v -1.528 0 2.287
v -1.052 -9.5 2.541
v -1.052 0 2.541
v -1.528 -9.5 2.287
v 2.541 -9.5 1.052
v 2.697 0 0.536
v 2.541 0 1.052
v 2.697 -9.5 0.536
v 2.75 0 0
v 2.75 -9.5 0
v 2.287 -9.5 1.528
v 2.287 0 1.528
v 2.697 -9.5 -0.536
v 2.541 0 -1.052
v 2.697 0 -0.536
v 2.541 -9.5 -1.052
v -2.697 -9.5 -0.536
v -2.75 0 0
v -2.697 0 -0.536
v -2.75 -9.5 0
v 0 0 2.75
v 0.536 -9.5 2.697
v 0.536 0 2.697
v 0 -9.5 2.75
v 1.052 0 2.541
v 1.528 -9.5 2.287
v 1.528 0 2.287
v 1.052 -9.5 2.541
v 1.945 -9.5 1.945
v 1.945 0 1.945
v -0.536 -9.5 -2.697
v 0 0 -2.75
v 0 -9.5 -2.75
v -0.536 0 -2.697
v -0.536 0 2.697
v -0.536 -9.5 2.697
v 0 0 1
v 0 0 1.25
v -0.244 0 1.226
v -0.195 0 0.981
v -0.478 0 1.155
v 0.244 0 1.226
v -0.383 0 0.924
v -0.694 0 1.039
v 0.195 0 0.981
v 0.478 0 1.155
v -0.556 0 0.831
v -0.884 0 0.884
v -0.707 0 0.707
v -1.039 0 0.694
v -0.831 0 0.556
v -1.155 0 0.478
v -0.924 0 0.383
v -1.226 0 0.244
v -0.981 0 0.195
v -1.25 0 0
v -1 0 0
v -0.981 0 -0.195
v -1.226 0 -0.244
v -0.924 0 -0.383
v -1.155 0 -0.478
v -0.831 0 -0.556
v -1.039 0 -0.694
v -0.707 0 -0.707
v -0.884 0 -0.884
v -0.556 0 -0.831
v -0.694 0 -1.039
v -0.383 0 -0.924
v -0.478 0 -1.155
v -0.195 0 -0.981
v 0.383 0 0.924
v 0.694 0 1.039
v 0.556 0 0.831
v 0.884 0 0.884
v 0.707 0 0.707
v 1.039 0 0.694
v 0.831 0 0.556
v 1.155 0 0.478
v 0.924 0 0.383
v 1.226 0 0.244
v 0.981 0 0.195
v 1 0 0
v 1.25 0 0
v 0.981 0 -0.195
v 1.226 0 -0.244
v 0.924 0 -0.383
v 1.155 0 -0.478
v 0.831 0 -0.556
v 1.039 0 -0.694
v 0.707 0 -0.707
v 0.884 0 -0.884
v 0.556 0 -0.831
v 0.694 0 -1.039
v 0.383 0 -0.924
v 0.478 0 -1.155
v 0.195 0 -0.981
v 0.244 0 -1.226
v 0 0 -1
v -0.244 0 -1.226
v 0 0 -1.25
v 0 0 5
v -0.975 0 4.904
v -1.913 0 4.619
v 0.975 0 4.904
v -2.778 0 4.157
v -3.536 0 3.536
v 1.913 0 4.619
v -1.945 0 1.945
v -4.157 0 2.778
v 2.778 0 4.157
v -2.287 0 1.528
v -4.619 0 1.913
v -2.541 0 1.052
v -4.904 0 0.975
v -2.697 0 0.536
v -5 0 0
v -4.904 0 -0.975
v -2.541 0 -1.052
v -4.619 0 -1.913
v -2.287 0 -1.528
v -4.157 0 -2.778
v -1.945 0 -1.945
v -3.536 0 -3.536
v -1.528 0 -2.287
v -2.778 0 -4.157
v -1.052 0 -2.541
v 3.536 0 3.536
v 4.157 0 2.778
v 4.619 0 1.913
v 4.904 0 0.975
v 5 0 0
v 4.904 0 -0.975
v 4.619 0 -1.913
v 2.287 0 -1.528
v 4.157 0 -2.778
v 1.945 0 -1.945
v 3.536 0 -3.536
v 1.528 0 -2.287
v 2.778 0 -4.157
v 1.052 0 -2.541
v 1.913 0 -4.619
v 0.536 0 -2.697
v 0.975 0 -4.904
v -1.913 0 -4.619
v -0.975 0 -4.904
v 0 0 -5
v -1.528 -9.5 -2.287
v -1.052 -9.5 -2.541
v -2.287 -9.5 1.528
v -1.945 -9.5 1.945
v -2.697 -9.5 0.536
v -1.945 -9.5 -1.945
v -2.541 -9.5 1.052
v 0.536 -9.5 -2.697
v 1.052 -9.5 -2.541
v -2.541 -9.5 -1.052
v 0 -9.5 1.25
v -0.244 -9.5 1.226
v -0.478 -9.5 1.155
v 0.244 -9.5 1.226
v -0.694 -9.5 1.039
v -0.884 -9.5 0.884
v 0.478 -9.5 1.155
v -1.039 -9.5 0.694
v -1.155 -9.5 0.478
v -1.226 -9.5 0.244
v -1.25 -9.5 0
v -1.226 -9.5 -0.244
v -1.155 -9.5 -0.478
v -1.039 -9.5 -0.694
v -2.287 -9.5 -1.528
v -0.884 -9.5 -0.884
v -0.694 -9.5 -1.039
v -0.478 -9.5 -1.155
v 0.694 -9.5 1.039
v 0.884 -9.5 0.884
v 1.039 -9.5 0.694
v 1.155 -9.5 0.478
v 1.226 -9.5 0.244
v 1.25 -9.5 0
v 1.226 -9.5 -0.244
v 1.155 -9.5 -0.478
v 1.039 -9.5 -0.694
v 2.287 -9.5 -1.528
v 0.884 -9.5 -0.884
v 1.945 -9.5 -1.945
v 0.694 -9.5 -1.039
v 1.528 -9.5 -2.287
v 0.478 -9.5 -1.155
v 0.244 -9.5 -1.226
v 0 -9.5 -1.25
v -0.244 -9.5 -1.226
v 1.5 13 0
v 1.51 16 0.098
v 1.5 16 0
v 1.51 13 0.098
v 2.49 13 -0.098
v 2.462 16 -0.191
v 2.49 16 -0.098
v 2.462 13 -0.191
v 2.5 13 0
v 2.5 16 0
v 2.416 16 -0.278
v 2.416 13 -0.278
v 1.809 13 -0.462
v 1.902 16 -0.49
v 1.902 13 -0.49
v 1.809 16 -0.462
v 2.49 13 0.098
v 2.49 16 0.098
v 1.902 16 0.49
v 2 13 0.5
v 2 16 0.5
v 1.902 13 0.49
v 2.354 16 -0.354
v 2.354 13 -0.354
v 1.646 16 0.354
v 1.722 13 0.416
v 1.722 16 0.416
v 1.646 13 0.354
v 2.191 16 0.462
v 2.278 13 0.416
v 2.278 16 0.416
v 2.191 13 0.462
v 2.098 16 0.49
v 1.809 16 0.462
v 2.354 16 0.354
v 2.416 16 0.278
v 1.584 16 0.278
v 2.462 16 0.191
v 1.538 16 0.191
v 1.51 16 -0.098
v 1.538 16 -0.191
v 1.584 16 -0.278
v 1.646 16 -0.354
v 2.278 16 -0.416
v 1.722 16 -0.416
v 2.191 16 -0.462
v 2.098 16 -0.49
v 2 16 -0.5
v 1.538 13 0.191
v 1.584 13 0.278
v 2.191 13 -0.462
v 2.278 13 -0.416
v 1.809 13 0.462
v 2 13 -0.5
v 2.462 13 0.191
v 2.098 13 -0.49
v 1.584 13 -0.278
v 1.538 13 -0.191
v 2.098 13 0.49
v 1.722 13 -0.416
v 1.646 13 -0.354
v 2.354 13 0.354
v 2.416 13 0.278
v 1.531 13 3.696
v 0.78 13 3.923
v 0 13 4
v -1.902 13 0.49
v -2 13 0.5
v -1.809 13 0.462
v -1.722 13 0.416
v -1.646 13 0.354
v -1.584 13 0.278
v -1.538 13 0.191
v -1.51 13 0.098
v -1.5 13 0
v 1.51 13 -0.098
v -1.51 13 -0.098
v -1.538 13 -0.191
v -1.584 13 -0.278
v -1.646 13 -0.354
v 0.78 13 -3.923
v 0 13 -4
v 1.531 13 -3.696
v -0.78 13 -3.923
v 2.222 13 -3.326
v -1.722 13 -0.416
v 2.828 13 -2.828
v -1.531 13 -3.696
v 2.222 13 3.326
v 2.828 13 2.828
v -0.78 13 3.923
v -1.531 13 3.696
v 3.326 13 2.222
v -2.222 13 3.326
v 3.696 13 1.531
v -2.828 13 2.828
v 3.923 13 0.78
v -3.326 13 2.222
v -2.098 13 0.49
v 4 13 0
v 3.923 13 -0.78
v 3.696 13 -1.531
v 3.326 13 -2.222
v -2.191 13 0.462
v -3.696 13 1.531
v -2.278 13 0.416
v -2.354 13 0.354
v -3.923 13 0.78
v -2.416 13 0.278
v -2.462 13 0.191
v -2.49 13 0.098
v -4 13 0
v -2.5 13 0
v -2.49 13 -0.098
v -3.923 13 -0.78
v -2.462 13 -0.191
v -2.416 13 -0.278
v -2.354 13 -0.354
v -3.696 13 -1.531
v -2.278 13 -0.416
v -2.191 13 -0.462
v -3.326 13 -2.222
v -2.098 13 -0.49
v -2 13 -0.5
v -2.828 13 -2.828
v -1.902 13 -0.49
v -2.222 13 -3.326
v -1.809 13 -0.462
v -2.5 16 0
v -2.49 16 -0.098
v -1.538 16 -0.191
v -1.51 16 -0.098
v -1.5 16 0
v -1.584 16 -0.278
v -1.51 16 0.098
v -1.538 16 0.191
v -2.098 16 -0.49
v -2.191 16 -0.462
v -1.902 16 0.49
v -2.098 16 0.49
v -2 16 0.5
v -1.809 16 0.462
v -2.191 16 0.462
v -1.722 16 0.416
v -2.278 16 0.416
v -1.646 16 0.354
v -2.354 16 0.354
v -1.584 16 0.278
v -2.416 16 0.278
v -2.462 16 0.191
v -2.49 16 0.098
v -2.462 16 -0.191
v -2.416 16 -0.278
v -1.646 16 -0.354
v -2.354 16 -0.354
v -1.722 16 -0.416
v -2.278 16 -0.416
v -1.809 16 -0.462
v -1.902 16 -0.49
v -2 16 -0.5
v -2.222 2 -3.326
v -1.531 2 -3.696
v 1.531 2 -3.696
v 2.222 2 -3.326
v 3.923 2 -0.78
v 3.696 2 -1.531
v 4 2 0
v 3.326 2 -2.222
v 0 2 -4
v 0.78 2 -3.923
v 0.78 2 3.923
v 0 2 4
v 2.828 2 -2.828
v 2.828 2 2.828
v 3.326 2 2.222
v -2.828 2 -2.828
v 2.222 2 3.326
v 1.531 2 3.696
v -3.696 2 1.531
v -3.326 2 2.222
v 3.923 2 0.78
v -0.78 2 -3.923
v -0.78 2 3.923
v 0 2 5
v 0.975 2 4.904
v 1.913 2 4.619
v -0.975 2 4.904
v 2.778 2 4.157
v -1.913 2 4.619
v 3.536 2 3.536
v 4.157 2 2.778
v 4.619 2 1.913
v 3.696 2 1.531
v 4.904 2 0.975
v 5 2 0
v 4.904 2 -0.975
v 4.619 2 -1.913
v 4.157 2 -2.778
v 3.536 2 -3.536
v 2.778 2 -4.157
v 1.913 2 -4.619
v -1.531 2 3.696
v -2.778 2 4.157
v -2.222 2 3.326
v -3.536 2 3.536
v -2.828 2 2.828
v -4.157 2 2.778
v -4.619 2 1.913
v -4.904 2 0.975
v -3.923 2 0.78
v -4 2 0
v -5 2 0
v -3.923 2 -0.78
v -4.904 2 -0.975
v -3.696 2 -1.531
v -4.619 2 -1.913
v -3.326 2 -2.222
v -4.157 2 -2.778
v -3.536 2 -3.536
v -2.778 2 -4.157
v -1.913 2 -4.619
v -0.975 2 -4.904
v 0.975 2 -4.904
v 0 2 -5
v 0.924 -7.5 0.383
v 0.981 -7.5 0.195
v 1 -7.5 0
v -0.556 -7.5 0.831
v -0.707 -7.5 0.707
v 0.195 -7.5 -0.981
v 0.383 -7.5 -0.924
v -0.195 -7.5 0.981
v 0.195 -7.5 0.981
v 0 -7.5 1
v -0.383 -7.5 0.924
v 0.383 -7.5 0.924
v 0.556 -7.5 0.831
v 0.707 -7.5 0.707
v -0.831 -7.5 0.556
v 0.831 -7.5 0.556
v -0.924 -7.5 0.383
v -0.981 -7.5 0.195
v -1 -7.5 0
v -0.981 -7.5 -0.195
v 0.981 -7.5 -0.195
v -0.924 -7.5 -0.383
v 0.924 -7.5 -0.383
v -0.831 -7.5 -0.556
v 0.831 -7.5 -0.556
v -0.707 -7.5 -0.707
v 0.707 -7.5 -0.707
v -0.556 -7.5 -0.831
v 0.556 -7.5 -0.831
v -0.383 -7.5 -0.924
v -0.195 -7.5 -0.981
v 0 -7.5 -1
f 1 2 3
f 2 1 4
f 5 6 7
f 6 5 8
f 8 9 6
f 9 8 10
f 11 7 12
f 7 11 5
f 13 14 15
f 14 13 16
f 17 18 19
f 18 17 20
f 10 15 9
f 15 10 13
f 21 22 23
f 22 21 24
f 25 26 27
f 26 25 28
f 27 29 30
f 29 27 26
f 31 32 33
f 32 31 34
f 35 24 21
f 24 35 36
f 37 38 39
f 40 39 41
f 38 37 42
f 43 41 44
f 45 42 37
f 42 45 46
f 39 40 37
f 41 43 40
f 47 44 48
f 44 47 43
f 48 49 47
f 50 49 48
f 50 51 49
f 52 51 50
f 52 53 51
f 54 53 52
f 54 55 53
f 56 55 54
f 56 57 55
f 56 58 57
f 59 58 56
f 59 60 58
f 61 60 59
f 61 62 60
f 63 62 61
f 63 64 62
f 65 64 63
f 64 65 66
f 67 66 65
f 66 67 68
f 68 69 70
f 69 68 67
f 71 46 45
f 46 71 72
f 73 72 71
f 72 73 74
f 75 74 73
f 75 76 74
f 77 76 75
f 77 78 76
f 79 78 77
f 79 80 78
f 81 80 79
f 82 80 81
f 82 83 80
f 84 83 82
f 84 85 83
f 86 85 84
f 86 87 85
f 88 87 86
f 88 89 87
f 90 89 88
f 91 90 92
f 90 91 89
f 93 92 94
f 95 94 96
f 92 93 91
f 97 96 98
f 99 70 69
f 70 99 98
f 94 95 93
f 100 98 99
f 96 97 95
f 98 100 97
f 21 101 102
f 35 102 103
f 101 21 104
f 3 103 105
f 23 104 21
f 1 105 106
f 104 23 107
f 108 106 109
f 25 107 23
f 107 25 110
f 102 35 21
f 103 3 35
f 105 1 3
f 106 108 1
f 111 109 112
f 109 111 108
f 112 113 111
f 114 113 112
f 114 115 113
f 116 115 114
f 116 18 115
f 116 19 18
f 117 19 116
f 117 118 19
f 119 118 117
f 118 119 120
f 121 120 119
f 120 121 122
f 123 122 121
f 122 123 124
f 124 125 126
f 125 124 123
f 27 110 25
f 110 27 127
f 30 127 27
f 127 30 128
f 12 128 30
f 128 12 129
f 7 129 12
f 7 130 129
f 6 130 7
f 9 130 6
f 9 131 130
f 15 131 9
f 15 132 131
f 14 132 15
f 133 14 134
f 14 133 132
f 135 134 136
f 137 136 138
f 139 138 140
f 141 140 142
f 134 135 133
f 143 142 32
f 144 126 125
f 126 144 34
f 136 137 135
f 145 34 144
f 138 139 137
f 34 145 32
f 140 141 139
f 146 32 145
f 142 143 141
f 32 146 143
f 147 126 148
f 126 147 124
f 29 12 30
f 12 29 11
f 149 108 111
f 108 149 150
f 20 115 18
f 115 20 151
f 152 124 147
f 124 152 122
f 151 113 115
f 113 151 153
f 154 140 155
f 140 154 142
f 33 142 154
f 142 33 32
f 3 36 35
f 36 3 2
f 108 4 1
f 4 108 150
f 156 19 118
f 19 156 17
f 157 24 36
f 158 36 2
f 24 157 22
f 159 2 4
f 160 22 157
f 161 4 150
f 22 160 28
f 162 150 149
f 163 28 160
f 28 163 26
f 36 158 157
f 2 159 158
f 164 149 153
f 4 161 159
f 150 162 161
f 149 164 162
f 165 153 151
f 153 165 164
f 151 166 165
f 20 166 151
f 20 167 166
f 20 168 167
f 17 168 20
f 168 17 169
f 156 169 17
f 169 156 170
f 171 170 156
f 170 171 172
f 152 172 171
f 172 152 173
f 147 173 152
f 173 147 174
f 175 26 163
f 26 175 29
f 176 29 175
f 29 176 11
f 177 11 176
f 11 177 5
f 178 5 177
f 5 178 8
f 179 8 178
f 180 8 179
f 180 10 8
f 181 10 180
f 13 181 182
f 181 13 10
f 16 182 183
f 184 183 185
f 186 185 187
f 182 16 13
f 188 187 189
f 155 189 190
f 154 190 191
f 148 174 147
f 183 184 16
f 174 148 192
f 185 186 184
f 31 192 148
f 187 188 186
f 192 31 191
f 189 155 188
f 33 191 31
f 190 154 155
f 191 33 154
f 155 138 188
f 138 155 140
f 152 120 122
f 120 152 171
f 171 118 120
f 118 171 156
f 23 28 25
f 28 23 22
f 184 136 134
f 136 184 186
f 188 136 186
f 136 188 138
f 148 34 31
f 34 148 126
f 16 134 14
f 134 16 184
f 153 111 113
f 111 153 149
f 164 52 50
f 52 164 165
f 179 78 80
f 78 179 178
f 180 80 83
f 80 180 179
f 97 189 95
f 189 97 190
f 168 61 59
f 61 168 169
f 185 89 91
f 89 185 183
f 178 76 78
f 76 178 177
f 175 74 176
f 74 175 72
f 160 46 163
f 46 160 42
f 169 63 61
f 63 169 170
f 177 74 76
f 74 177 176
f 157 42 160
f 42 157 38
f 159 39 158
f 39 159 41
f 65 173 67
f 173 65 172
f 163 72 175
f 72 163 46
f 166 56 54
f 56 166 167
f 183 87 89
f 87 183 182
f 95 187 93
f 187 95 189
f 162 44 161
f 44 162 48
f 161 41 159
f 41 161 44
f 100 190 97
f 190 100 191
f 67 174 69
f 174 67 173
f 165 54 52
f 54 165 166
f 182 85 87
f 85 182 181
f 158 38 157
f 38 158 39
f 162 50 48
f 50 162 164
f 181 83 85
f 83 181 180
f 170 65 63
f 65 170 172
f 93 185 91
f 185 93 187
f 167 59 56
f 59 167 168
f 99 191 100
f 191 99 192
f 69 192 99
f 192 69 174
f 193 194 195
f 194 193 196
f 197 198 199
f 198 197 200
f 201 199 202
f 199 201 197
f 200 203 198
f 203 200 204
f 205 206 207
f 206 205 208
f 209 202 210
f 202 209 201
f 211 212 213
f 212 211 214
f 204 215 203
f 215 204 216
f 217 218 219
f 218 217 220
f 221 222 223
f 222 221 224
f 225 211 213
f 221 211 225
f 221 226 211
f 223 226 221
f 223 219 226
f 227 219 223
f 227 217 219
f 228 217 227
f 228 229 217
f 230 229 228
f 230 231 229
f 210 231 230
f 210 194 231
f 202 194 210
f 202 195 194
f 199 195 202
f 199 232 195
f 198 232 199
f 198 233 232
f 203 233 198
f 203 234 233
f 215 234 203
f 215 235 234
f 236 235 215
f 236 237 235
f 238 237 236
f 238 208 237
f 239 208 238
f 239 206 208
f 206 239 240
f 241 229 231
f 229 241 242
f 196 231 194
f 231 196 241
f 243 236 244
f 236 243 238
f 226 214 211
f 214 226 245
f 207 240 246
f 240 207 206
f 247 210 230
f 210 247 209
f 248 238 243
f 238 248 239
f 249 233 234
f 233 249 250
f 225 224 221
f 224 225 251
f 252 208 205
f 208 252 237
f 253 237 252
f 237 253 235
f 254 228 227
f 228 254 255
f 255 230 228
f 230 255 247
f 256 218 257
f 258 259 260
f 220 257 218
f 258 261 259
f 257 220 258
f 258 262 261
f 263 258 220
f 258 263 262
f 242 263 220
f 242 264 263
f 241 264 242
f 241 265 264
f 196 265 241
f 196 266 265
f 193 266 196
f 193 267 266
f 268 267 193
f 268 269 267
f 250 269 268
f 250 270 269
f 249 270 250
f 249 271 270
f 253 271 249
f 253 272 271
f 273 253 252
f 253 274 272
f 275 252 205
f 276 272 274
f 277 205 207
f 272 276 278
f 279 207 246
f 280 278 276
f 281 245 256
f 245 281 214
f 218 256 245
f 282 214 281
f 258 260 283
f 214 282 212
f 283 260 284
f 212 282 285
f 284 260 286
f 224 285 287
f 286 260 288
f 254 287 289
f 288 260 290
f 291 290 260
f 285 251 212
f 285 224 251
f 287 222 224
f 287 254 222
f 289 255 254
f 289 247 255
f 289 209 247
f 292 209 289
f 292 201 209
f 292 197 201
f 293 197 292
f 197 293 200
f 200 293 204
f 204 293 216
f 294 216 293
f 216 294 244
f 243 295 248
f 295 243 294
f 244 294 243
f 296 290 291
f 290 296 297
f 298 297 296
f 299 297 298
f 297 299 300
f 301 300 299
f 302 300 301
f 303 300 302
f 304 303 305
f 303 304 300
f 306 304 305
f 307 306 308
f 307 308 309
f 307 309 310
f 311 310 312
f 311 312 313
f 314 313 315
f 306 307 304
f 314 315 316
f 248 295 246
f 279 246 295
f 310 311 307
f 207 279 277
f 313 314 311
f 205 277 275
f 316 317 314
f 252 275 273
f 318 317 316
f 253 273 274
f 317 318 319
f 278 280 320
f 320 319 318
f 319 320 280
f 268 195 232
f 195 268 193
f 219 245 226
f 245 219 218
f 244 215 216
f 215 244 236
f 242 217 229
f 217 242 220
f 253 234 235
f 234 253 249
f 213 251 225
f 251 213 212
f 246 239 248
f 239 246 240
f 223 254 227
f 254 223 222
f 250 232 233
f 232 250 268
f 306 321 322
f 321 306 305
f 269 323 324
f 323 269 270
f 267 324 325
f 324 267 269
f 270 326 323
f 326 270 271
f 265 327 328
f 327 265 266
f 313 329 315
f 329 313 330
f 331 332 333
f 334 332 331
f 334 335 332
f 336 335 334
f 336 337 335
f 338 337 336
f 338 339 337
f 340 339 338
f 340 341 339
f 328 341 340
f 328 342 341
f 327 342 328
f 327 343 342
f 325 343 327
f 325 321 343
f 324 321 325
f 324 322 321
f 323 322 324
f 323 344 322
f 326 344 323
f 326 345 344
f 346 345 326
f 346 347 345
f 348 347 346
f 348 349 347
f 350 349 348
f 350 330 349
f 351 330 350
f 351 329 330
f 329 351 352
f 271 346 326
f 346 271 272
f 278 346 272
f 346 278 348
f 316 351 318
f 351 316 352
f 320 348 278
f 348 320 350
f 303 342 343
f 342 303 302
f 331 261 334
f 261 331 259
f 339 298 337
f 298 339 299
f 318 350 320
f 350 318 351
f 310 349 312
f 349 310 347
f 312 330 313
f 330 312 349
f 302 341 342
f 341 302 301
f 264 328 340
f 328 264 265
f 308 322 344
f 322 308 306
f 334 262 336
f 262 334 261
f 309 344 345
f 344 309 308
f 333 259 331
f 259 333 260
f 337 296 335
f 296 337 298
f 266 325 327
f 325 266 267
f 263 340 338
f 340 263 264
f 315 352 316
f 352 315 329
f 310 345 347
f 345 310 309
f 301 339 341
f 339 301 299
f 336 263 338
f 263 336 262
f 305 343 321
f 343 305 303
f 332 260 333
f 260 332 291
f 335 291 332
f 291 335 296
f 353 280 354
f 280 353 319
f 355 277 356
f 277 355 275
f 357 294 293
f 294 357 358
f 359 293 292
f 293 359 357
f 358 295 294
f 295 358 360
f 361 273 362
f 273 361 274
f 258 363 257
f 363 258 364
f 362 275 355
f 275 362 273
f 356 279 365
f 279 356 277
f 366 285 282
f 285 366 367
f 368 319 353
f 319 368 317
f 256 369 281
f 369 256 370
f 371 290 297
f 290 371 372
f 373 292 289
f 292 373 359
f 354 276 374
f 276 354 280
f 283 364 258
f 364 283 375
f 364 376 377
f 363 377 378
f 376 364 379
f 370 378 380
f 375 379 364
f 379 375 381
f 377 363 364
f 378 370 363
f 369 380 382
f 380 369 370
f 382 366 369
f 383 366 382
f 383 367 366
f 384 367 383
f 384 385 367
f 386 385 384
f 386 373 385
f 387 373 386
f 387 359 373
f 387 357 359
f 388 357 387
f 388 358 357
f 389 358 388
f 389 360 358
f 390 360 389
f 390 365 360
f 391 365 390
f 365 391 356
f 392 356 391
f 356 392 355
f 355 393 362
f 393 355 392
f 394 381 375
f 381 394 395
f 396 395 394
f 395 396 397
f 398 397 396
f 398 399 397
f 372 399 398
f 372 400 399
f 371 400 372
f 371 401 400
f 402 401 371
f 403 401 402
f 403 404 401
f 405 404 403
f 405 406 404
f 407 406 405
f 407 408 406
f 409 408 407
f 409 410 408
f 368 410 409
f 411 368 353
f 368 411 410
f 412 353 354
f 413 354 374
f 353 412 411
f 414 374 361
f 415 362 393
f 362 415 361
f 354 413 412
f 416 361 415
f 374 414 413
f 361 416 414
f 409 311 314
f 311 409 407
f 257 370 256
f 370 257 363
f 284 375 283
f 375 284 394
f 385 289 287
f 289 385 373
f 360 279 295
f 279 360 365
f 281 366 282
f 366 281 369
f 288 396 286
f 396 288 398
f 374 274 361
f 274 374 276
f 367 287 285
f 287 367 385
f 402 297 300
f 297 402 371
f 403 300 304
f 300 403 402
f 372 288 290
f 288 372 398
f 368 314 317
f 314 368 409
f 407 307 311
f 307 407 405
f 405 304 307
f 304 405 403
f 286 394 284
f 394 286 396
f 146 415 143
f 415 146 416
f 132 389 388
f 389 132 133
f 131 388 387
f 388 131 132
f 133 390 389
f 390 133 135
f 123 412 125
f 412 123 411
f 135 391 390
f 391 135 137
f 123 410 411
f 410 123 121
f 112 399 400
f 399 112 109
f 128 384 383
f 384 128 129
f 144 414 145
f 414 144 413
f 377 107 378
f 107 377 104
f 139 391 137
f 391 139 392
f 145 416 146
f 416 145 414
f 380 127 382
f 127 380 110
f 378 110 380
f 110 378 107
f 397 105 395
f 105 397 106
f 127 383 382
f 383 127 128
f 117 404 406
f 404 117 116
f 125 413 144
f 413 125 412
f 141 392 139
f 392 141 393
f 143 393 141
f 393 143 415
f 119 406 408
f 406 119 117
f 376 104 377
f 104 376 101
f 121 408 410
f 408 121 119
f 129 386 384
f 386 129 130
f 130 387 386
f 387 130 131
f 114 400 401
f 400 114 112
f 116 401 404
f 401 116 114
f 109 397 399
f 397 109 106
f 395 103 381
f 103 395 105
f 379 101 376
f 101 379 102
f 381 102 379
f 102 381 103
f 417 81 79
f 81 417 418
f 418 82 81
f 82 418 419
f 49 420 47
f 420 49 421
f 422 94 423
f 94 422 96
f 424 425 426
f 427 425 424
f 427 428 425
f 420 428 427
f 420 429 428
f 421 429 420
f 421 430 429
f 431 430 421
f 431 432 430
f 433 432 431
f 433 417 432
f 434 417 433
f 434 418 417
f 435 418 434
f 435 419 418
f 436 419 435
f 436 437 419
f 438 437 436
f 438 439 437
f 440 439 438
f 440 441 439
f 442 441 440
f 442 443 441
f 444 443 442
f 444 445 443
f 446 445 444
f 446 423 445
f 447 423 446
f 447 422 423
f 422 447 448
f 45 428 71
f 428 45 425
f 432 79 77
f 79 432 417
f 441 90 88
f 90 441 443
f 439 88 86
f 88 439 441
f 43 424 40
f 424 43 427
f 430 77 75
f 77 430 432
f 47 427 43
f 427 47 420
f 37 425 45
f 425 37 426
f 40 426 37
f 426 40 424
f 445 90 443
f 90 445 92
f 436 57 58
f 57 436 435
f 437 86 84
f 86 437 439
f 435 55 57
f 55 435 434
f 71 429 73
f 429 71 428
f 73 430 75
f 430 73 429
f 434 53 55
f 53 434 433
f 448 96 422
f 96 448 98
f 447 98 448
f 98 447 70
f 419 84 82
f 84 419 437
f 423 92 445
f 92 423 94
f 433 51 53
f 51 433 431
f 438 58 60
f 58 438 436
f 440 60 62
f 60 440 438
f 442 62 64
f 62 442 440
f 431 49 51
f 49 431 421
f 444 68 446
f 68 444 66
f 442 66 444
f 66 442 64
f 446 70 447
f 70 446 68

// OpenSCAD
// DC Barrel Jack 5.5x2.5mm
// Panel mount DC power connector
// 5.5mm outer diameter, 2.5mm center pin

module barrel_jack_5_5x2_5() {
    // Barrel dimensions (external connection)
    barrel_outer_diameter = 5.5;
    barrel_inner_diameter = 2.5;
    barrel_depth = 9.5;

    // Body dimensions (behind panel)
    body_diameter = 8;
    body_length = 11;

    // Panel mount nut area
    nut_diameter = 10;
    nut_thickness = 2;

    // Solder terminals extend behind body
    terminal_length = 3;

    $fn = 32;

    union() {
        // Main cylindrical body (behind panel)
        color("black") {
            translate([0, nut_thickness, 0])
                rotate([-90, 0, 0])
                    cylinder(h = body_length, d = body_diameter);
        }

        // Mounting nut/flange (at panel surface)
        color("silver") {
            rotate([-90, 0, 0])
                cylinder(h = nut_thickness, d = nut_diameter);
        }

        // Barrel socket opening (front, external side)
        color("dimgray") {
            rotate([90, 0, 0]) {
                difference() {
                    cylinder(h = barrel_depth, d = barrel_outer_diameter);
                    translate([0, 0, -0.1])
                        cylinder(h = barrel_depth + 0.2, d = barrel_inner_diameter);
                }
            }
        }

        // Center pin (inside barrel)
        color("gold") {
            rotate([90, 0, 0])
                cylinder(h = barrel_depth - 2, d = barrel_inner_diameter * 0.8);
        }

        // Solder terminals (behind body)
        color("silver") {
            translate([0, nut_thickness + body_length, 0]) {
                // Positive terminal
                translate([2, 0, 0])
                    rotate([-90, 0, 0])
                        cylinder(h = terminal_length, d = 1);
                // Negative terminal
                translate([-2, 0, 0])
                    rotate([-90, 0, 0])
                        cylinder(h = terminal_length, d = 1);
            }
        }
    }
}

// Panel cutout dimensions for reference
function barrel_jack_panel_cutout_diameter() = 8;

// Preview
barrel_jack_5_5x2_5();
